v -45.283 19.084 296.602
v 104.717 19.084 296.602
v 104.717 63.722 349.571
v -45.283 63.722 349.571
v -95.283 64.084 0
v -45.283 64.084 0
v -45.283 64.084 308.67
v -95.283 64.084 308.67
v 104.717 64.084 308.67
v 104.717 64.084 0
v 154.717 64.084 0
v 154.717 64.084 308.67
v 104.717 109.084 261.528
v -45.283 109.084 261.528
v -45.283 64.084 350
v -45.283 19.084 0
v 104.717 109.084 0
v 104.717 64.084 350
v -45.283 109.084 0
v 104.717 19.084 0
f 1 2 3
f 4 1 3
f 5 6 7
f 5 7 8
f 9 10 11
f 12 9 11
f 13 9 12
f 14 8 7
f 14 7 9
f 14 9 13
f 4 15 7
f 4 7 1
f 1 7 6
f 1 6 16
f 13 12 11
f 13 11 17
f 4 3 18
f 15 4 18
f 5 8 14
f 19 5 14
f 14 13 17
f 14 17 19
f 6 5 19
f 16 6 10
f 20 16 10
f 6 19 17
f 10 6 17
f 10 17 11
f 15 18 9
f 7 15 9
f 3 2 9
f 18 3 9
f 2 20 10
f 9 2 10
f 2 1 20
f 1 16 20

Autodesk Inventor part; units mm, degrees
ref_plane "YZ Plane" through (0, 0, 0) normal (1, 0, 0) x (0, 1, 0)
ref_plane "XZ Plane" through (0, 0, 0) normal (0, 1, 0) x (-1, 0, 0)
ref_plane "XY Plane" through (0, 0, 0) normal (0, 0, 1) x (1, 0, 0)
sketch "Эскиз2" plane through (0, 0, 0) normal (0, 0, 1) x (1, 0, 0)
  line L0 (104.717, 109.0836) -> (-45.283, 109.0836)
  line L1 (-45.283, 109.0836) -> (-45.283, 19.0836)
  line L2 (-45.283, 19.0836) -> (104.717, 19.0836)
  line L3 (104.717, 19.0836) -> (104.717, 109.0836)
  line L4 (-95.283, 19.0836) -> (154.717, 19.0836)
  line L5 (154.717, 19.0836) -> (154.717, 109.0836)
  line L6 (154.717, 109.0836) -> (-95.283, 109.0836)
  line L7 (-95.283, 109.0836) -> (-95.283, 19.0836)
  line L8 (154.717, 19.0836) -> (104.717, 19.0836)
  line L9 (104.717, 19.0836) -> (104.717, -10.9164)
  line L10 (104.717, -10.9164) -> (154.717, -10.9164)
  line L11 (154.717, -10.9164) -> (154.717, 19.0836)
  line L12 (-45.283, 19.0836) -> (-95.283, 19.0836)
  line L13 (-95.283, 19.0836) -> (-95.283, -10.9164)
  line L14 (-95.283, -10.9164) -> (-45.283, -10.9164)
  line L15 (-45.283, -10.9164) -> (-45.283, 19.0836)
  line L16 (-45.283, 64.0836) -> (-95.283, 64.0836)
  line L17 (-95.283, 64.0836) -> (-45.283, 109.0836)
  line L18 (104.717, 64.0836) -> (154.717, 64.0836)
  line L19 (154.717, 64.0836) -> (104.717, 109.0836)
  point P0 (0, 0)
  dimension "d0" = 150
  dimension "d1" = 50
  dimension "d2" = 50
  dimension "d3" = 30
  dimension "d4" = 90
  dimension "d5" = 0
  dimension "d6" = 0
extrude "Выдавливание1" add sketch "Эскиз2" along normal blind 350 contours L3 L2 L1 L0 | L19 L18 L3 | L1 L16 L17
sketch "Эскиз3" plane through (-45.283, 19.0836, 0) normal (-1, 0, 0) x (0, 0, 1)
  line L0 (0, 0) -> (350, 0) projected
  line L1 (296.6019, 0) -> (349.571, 44.6384)
  line L2 (350, 45) -> (350, 0) projected
  line L3 (349.571, 44.6384) -> (350, 45)
  line L4 (350, 45) -> (308.6701, 45)
  line L5 (0, 45) -> (350, 45) projected
  line L6 (308.6701, 45) -> (261.5284, 90)
  line L7 (0, 90) -> (350, 90) projected
  line L8 (0, 45) -> (0, 90) projected
  line L9 (350, 0) -> (0, 0)
  line L10 (0, 0) -> (0, 90)
  line L11 (0, 90) -> (350, 90)
  line L12 (350, 90) -> (350, 0)
  point P0 (0, -19.0836)
extrude "Выдавливание2" cut sketch "Эскиз3" against normal mid plane 1000 contours L1 L3 L2 L0 | L6 L7 L12 L4
properties part number "пример корпуса 1"
